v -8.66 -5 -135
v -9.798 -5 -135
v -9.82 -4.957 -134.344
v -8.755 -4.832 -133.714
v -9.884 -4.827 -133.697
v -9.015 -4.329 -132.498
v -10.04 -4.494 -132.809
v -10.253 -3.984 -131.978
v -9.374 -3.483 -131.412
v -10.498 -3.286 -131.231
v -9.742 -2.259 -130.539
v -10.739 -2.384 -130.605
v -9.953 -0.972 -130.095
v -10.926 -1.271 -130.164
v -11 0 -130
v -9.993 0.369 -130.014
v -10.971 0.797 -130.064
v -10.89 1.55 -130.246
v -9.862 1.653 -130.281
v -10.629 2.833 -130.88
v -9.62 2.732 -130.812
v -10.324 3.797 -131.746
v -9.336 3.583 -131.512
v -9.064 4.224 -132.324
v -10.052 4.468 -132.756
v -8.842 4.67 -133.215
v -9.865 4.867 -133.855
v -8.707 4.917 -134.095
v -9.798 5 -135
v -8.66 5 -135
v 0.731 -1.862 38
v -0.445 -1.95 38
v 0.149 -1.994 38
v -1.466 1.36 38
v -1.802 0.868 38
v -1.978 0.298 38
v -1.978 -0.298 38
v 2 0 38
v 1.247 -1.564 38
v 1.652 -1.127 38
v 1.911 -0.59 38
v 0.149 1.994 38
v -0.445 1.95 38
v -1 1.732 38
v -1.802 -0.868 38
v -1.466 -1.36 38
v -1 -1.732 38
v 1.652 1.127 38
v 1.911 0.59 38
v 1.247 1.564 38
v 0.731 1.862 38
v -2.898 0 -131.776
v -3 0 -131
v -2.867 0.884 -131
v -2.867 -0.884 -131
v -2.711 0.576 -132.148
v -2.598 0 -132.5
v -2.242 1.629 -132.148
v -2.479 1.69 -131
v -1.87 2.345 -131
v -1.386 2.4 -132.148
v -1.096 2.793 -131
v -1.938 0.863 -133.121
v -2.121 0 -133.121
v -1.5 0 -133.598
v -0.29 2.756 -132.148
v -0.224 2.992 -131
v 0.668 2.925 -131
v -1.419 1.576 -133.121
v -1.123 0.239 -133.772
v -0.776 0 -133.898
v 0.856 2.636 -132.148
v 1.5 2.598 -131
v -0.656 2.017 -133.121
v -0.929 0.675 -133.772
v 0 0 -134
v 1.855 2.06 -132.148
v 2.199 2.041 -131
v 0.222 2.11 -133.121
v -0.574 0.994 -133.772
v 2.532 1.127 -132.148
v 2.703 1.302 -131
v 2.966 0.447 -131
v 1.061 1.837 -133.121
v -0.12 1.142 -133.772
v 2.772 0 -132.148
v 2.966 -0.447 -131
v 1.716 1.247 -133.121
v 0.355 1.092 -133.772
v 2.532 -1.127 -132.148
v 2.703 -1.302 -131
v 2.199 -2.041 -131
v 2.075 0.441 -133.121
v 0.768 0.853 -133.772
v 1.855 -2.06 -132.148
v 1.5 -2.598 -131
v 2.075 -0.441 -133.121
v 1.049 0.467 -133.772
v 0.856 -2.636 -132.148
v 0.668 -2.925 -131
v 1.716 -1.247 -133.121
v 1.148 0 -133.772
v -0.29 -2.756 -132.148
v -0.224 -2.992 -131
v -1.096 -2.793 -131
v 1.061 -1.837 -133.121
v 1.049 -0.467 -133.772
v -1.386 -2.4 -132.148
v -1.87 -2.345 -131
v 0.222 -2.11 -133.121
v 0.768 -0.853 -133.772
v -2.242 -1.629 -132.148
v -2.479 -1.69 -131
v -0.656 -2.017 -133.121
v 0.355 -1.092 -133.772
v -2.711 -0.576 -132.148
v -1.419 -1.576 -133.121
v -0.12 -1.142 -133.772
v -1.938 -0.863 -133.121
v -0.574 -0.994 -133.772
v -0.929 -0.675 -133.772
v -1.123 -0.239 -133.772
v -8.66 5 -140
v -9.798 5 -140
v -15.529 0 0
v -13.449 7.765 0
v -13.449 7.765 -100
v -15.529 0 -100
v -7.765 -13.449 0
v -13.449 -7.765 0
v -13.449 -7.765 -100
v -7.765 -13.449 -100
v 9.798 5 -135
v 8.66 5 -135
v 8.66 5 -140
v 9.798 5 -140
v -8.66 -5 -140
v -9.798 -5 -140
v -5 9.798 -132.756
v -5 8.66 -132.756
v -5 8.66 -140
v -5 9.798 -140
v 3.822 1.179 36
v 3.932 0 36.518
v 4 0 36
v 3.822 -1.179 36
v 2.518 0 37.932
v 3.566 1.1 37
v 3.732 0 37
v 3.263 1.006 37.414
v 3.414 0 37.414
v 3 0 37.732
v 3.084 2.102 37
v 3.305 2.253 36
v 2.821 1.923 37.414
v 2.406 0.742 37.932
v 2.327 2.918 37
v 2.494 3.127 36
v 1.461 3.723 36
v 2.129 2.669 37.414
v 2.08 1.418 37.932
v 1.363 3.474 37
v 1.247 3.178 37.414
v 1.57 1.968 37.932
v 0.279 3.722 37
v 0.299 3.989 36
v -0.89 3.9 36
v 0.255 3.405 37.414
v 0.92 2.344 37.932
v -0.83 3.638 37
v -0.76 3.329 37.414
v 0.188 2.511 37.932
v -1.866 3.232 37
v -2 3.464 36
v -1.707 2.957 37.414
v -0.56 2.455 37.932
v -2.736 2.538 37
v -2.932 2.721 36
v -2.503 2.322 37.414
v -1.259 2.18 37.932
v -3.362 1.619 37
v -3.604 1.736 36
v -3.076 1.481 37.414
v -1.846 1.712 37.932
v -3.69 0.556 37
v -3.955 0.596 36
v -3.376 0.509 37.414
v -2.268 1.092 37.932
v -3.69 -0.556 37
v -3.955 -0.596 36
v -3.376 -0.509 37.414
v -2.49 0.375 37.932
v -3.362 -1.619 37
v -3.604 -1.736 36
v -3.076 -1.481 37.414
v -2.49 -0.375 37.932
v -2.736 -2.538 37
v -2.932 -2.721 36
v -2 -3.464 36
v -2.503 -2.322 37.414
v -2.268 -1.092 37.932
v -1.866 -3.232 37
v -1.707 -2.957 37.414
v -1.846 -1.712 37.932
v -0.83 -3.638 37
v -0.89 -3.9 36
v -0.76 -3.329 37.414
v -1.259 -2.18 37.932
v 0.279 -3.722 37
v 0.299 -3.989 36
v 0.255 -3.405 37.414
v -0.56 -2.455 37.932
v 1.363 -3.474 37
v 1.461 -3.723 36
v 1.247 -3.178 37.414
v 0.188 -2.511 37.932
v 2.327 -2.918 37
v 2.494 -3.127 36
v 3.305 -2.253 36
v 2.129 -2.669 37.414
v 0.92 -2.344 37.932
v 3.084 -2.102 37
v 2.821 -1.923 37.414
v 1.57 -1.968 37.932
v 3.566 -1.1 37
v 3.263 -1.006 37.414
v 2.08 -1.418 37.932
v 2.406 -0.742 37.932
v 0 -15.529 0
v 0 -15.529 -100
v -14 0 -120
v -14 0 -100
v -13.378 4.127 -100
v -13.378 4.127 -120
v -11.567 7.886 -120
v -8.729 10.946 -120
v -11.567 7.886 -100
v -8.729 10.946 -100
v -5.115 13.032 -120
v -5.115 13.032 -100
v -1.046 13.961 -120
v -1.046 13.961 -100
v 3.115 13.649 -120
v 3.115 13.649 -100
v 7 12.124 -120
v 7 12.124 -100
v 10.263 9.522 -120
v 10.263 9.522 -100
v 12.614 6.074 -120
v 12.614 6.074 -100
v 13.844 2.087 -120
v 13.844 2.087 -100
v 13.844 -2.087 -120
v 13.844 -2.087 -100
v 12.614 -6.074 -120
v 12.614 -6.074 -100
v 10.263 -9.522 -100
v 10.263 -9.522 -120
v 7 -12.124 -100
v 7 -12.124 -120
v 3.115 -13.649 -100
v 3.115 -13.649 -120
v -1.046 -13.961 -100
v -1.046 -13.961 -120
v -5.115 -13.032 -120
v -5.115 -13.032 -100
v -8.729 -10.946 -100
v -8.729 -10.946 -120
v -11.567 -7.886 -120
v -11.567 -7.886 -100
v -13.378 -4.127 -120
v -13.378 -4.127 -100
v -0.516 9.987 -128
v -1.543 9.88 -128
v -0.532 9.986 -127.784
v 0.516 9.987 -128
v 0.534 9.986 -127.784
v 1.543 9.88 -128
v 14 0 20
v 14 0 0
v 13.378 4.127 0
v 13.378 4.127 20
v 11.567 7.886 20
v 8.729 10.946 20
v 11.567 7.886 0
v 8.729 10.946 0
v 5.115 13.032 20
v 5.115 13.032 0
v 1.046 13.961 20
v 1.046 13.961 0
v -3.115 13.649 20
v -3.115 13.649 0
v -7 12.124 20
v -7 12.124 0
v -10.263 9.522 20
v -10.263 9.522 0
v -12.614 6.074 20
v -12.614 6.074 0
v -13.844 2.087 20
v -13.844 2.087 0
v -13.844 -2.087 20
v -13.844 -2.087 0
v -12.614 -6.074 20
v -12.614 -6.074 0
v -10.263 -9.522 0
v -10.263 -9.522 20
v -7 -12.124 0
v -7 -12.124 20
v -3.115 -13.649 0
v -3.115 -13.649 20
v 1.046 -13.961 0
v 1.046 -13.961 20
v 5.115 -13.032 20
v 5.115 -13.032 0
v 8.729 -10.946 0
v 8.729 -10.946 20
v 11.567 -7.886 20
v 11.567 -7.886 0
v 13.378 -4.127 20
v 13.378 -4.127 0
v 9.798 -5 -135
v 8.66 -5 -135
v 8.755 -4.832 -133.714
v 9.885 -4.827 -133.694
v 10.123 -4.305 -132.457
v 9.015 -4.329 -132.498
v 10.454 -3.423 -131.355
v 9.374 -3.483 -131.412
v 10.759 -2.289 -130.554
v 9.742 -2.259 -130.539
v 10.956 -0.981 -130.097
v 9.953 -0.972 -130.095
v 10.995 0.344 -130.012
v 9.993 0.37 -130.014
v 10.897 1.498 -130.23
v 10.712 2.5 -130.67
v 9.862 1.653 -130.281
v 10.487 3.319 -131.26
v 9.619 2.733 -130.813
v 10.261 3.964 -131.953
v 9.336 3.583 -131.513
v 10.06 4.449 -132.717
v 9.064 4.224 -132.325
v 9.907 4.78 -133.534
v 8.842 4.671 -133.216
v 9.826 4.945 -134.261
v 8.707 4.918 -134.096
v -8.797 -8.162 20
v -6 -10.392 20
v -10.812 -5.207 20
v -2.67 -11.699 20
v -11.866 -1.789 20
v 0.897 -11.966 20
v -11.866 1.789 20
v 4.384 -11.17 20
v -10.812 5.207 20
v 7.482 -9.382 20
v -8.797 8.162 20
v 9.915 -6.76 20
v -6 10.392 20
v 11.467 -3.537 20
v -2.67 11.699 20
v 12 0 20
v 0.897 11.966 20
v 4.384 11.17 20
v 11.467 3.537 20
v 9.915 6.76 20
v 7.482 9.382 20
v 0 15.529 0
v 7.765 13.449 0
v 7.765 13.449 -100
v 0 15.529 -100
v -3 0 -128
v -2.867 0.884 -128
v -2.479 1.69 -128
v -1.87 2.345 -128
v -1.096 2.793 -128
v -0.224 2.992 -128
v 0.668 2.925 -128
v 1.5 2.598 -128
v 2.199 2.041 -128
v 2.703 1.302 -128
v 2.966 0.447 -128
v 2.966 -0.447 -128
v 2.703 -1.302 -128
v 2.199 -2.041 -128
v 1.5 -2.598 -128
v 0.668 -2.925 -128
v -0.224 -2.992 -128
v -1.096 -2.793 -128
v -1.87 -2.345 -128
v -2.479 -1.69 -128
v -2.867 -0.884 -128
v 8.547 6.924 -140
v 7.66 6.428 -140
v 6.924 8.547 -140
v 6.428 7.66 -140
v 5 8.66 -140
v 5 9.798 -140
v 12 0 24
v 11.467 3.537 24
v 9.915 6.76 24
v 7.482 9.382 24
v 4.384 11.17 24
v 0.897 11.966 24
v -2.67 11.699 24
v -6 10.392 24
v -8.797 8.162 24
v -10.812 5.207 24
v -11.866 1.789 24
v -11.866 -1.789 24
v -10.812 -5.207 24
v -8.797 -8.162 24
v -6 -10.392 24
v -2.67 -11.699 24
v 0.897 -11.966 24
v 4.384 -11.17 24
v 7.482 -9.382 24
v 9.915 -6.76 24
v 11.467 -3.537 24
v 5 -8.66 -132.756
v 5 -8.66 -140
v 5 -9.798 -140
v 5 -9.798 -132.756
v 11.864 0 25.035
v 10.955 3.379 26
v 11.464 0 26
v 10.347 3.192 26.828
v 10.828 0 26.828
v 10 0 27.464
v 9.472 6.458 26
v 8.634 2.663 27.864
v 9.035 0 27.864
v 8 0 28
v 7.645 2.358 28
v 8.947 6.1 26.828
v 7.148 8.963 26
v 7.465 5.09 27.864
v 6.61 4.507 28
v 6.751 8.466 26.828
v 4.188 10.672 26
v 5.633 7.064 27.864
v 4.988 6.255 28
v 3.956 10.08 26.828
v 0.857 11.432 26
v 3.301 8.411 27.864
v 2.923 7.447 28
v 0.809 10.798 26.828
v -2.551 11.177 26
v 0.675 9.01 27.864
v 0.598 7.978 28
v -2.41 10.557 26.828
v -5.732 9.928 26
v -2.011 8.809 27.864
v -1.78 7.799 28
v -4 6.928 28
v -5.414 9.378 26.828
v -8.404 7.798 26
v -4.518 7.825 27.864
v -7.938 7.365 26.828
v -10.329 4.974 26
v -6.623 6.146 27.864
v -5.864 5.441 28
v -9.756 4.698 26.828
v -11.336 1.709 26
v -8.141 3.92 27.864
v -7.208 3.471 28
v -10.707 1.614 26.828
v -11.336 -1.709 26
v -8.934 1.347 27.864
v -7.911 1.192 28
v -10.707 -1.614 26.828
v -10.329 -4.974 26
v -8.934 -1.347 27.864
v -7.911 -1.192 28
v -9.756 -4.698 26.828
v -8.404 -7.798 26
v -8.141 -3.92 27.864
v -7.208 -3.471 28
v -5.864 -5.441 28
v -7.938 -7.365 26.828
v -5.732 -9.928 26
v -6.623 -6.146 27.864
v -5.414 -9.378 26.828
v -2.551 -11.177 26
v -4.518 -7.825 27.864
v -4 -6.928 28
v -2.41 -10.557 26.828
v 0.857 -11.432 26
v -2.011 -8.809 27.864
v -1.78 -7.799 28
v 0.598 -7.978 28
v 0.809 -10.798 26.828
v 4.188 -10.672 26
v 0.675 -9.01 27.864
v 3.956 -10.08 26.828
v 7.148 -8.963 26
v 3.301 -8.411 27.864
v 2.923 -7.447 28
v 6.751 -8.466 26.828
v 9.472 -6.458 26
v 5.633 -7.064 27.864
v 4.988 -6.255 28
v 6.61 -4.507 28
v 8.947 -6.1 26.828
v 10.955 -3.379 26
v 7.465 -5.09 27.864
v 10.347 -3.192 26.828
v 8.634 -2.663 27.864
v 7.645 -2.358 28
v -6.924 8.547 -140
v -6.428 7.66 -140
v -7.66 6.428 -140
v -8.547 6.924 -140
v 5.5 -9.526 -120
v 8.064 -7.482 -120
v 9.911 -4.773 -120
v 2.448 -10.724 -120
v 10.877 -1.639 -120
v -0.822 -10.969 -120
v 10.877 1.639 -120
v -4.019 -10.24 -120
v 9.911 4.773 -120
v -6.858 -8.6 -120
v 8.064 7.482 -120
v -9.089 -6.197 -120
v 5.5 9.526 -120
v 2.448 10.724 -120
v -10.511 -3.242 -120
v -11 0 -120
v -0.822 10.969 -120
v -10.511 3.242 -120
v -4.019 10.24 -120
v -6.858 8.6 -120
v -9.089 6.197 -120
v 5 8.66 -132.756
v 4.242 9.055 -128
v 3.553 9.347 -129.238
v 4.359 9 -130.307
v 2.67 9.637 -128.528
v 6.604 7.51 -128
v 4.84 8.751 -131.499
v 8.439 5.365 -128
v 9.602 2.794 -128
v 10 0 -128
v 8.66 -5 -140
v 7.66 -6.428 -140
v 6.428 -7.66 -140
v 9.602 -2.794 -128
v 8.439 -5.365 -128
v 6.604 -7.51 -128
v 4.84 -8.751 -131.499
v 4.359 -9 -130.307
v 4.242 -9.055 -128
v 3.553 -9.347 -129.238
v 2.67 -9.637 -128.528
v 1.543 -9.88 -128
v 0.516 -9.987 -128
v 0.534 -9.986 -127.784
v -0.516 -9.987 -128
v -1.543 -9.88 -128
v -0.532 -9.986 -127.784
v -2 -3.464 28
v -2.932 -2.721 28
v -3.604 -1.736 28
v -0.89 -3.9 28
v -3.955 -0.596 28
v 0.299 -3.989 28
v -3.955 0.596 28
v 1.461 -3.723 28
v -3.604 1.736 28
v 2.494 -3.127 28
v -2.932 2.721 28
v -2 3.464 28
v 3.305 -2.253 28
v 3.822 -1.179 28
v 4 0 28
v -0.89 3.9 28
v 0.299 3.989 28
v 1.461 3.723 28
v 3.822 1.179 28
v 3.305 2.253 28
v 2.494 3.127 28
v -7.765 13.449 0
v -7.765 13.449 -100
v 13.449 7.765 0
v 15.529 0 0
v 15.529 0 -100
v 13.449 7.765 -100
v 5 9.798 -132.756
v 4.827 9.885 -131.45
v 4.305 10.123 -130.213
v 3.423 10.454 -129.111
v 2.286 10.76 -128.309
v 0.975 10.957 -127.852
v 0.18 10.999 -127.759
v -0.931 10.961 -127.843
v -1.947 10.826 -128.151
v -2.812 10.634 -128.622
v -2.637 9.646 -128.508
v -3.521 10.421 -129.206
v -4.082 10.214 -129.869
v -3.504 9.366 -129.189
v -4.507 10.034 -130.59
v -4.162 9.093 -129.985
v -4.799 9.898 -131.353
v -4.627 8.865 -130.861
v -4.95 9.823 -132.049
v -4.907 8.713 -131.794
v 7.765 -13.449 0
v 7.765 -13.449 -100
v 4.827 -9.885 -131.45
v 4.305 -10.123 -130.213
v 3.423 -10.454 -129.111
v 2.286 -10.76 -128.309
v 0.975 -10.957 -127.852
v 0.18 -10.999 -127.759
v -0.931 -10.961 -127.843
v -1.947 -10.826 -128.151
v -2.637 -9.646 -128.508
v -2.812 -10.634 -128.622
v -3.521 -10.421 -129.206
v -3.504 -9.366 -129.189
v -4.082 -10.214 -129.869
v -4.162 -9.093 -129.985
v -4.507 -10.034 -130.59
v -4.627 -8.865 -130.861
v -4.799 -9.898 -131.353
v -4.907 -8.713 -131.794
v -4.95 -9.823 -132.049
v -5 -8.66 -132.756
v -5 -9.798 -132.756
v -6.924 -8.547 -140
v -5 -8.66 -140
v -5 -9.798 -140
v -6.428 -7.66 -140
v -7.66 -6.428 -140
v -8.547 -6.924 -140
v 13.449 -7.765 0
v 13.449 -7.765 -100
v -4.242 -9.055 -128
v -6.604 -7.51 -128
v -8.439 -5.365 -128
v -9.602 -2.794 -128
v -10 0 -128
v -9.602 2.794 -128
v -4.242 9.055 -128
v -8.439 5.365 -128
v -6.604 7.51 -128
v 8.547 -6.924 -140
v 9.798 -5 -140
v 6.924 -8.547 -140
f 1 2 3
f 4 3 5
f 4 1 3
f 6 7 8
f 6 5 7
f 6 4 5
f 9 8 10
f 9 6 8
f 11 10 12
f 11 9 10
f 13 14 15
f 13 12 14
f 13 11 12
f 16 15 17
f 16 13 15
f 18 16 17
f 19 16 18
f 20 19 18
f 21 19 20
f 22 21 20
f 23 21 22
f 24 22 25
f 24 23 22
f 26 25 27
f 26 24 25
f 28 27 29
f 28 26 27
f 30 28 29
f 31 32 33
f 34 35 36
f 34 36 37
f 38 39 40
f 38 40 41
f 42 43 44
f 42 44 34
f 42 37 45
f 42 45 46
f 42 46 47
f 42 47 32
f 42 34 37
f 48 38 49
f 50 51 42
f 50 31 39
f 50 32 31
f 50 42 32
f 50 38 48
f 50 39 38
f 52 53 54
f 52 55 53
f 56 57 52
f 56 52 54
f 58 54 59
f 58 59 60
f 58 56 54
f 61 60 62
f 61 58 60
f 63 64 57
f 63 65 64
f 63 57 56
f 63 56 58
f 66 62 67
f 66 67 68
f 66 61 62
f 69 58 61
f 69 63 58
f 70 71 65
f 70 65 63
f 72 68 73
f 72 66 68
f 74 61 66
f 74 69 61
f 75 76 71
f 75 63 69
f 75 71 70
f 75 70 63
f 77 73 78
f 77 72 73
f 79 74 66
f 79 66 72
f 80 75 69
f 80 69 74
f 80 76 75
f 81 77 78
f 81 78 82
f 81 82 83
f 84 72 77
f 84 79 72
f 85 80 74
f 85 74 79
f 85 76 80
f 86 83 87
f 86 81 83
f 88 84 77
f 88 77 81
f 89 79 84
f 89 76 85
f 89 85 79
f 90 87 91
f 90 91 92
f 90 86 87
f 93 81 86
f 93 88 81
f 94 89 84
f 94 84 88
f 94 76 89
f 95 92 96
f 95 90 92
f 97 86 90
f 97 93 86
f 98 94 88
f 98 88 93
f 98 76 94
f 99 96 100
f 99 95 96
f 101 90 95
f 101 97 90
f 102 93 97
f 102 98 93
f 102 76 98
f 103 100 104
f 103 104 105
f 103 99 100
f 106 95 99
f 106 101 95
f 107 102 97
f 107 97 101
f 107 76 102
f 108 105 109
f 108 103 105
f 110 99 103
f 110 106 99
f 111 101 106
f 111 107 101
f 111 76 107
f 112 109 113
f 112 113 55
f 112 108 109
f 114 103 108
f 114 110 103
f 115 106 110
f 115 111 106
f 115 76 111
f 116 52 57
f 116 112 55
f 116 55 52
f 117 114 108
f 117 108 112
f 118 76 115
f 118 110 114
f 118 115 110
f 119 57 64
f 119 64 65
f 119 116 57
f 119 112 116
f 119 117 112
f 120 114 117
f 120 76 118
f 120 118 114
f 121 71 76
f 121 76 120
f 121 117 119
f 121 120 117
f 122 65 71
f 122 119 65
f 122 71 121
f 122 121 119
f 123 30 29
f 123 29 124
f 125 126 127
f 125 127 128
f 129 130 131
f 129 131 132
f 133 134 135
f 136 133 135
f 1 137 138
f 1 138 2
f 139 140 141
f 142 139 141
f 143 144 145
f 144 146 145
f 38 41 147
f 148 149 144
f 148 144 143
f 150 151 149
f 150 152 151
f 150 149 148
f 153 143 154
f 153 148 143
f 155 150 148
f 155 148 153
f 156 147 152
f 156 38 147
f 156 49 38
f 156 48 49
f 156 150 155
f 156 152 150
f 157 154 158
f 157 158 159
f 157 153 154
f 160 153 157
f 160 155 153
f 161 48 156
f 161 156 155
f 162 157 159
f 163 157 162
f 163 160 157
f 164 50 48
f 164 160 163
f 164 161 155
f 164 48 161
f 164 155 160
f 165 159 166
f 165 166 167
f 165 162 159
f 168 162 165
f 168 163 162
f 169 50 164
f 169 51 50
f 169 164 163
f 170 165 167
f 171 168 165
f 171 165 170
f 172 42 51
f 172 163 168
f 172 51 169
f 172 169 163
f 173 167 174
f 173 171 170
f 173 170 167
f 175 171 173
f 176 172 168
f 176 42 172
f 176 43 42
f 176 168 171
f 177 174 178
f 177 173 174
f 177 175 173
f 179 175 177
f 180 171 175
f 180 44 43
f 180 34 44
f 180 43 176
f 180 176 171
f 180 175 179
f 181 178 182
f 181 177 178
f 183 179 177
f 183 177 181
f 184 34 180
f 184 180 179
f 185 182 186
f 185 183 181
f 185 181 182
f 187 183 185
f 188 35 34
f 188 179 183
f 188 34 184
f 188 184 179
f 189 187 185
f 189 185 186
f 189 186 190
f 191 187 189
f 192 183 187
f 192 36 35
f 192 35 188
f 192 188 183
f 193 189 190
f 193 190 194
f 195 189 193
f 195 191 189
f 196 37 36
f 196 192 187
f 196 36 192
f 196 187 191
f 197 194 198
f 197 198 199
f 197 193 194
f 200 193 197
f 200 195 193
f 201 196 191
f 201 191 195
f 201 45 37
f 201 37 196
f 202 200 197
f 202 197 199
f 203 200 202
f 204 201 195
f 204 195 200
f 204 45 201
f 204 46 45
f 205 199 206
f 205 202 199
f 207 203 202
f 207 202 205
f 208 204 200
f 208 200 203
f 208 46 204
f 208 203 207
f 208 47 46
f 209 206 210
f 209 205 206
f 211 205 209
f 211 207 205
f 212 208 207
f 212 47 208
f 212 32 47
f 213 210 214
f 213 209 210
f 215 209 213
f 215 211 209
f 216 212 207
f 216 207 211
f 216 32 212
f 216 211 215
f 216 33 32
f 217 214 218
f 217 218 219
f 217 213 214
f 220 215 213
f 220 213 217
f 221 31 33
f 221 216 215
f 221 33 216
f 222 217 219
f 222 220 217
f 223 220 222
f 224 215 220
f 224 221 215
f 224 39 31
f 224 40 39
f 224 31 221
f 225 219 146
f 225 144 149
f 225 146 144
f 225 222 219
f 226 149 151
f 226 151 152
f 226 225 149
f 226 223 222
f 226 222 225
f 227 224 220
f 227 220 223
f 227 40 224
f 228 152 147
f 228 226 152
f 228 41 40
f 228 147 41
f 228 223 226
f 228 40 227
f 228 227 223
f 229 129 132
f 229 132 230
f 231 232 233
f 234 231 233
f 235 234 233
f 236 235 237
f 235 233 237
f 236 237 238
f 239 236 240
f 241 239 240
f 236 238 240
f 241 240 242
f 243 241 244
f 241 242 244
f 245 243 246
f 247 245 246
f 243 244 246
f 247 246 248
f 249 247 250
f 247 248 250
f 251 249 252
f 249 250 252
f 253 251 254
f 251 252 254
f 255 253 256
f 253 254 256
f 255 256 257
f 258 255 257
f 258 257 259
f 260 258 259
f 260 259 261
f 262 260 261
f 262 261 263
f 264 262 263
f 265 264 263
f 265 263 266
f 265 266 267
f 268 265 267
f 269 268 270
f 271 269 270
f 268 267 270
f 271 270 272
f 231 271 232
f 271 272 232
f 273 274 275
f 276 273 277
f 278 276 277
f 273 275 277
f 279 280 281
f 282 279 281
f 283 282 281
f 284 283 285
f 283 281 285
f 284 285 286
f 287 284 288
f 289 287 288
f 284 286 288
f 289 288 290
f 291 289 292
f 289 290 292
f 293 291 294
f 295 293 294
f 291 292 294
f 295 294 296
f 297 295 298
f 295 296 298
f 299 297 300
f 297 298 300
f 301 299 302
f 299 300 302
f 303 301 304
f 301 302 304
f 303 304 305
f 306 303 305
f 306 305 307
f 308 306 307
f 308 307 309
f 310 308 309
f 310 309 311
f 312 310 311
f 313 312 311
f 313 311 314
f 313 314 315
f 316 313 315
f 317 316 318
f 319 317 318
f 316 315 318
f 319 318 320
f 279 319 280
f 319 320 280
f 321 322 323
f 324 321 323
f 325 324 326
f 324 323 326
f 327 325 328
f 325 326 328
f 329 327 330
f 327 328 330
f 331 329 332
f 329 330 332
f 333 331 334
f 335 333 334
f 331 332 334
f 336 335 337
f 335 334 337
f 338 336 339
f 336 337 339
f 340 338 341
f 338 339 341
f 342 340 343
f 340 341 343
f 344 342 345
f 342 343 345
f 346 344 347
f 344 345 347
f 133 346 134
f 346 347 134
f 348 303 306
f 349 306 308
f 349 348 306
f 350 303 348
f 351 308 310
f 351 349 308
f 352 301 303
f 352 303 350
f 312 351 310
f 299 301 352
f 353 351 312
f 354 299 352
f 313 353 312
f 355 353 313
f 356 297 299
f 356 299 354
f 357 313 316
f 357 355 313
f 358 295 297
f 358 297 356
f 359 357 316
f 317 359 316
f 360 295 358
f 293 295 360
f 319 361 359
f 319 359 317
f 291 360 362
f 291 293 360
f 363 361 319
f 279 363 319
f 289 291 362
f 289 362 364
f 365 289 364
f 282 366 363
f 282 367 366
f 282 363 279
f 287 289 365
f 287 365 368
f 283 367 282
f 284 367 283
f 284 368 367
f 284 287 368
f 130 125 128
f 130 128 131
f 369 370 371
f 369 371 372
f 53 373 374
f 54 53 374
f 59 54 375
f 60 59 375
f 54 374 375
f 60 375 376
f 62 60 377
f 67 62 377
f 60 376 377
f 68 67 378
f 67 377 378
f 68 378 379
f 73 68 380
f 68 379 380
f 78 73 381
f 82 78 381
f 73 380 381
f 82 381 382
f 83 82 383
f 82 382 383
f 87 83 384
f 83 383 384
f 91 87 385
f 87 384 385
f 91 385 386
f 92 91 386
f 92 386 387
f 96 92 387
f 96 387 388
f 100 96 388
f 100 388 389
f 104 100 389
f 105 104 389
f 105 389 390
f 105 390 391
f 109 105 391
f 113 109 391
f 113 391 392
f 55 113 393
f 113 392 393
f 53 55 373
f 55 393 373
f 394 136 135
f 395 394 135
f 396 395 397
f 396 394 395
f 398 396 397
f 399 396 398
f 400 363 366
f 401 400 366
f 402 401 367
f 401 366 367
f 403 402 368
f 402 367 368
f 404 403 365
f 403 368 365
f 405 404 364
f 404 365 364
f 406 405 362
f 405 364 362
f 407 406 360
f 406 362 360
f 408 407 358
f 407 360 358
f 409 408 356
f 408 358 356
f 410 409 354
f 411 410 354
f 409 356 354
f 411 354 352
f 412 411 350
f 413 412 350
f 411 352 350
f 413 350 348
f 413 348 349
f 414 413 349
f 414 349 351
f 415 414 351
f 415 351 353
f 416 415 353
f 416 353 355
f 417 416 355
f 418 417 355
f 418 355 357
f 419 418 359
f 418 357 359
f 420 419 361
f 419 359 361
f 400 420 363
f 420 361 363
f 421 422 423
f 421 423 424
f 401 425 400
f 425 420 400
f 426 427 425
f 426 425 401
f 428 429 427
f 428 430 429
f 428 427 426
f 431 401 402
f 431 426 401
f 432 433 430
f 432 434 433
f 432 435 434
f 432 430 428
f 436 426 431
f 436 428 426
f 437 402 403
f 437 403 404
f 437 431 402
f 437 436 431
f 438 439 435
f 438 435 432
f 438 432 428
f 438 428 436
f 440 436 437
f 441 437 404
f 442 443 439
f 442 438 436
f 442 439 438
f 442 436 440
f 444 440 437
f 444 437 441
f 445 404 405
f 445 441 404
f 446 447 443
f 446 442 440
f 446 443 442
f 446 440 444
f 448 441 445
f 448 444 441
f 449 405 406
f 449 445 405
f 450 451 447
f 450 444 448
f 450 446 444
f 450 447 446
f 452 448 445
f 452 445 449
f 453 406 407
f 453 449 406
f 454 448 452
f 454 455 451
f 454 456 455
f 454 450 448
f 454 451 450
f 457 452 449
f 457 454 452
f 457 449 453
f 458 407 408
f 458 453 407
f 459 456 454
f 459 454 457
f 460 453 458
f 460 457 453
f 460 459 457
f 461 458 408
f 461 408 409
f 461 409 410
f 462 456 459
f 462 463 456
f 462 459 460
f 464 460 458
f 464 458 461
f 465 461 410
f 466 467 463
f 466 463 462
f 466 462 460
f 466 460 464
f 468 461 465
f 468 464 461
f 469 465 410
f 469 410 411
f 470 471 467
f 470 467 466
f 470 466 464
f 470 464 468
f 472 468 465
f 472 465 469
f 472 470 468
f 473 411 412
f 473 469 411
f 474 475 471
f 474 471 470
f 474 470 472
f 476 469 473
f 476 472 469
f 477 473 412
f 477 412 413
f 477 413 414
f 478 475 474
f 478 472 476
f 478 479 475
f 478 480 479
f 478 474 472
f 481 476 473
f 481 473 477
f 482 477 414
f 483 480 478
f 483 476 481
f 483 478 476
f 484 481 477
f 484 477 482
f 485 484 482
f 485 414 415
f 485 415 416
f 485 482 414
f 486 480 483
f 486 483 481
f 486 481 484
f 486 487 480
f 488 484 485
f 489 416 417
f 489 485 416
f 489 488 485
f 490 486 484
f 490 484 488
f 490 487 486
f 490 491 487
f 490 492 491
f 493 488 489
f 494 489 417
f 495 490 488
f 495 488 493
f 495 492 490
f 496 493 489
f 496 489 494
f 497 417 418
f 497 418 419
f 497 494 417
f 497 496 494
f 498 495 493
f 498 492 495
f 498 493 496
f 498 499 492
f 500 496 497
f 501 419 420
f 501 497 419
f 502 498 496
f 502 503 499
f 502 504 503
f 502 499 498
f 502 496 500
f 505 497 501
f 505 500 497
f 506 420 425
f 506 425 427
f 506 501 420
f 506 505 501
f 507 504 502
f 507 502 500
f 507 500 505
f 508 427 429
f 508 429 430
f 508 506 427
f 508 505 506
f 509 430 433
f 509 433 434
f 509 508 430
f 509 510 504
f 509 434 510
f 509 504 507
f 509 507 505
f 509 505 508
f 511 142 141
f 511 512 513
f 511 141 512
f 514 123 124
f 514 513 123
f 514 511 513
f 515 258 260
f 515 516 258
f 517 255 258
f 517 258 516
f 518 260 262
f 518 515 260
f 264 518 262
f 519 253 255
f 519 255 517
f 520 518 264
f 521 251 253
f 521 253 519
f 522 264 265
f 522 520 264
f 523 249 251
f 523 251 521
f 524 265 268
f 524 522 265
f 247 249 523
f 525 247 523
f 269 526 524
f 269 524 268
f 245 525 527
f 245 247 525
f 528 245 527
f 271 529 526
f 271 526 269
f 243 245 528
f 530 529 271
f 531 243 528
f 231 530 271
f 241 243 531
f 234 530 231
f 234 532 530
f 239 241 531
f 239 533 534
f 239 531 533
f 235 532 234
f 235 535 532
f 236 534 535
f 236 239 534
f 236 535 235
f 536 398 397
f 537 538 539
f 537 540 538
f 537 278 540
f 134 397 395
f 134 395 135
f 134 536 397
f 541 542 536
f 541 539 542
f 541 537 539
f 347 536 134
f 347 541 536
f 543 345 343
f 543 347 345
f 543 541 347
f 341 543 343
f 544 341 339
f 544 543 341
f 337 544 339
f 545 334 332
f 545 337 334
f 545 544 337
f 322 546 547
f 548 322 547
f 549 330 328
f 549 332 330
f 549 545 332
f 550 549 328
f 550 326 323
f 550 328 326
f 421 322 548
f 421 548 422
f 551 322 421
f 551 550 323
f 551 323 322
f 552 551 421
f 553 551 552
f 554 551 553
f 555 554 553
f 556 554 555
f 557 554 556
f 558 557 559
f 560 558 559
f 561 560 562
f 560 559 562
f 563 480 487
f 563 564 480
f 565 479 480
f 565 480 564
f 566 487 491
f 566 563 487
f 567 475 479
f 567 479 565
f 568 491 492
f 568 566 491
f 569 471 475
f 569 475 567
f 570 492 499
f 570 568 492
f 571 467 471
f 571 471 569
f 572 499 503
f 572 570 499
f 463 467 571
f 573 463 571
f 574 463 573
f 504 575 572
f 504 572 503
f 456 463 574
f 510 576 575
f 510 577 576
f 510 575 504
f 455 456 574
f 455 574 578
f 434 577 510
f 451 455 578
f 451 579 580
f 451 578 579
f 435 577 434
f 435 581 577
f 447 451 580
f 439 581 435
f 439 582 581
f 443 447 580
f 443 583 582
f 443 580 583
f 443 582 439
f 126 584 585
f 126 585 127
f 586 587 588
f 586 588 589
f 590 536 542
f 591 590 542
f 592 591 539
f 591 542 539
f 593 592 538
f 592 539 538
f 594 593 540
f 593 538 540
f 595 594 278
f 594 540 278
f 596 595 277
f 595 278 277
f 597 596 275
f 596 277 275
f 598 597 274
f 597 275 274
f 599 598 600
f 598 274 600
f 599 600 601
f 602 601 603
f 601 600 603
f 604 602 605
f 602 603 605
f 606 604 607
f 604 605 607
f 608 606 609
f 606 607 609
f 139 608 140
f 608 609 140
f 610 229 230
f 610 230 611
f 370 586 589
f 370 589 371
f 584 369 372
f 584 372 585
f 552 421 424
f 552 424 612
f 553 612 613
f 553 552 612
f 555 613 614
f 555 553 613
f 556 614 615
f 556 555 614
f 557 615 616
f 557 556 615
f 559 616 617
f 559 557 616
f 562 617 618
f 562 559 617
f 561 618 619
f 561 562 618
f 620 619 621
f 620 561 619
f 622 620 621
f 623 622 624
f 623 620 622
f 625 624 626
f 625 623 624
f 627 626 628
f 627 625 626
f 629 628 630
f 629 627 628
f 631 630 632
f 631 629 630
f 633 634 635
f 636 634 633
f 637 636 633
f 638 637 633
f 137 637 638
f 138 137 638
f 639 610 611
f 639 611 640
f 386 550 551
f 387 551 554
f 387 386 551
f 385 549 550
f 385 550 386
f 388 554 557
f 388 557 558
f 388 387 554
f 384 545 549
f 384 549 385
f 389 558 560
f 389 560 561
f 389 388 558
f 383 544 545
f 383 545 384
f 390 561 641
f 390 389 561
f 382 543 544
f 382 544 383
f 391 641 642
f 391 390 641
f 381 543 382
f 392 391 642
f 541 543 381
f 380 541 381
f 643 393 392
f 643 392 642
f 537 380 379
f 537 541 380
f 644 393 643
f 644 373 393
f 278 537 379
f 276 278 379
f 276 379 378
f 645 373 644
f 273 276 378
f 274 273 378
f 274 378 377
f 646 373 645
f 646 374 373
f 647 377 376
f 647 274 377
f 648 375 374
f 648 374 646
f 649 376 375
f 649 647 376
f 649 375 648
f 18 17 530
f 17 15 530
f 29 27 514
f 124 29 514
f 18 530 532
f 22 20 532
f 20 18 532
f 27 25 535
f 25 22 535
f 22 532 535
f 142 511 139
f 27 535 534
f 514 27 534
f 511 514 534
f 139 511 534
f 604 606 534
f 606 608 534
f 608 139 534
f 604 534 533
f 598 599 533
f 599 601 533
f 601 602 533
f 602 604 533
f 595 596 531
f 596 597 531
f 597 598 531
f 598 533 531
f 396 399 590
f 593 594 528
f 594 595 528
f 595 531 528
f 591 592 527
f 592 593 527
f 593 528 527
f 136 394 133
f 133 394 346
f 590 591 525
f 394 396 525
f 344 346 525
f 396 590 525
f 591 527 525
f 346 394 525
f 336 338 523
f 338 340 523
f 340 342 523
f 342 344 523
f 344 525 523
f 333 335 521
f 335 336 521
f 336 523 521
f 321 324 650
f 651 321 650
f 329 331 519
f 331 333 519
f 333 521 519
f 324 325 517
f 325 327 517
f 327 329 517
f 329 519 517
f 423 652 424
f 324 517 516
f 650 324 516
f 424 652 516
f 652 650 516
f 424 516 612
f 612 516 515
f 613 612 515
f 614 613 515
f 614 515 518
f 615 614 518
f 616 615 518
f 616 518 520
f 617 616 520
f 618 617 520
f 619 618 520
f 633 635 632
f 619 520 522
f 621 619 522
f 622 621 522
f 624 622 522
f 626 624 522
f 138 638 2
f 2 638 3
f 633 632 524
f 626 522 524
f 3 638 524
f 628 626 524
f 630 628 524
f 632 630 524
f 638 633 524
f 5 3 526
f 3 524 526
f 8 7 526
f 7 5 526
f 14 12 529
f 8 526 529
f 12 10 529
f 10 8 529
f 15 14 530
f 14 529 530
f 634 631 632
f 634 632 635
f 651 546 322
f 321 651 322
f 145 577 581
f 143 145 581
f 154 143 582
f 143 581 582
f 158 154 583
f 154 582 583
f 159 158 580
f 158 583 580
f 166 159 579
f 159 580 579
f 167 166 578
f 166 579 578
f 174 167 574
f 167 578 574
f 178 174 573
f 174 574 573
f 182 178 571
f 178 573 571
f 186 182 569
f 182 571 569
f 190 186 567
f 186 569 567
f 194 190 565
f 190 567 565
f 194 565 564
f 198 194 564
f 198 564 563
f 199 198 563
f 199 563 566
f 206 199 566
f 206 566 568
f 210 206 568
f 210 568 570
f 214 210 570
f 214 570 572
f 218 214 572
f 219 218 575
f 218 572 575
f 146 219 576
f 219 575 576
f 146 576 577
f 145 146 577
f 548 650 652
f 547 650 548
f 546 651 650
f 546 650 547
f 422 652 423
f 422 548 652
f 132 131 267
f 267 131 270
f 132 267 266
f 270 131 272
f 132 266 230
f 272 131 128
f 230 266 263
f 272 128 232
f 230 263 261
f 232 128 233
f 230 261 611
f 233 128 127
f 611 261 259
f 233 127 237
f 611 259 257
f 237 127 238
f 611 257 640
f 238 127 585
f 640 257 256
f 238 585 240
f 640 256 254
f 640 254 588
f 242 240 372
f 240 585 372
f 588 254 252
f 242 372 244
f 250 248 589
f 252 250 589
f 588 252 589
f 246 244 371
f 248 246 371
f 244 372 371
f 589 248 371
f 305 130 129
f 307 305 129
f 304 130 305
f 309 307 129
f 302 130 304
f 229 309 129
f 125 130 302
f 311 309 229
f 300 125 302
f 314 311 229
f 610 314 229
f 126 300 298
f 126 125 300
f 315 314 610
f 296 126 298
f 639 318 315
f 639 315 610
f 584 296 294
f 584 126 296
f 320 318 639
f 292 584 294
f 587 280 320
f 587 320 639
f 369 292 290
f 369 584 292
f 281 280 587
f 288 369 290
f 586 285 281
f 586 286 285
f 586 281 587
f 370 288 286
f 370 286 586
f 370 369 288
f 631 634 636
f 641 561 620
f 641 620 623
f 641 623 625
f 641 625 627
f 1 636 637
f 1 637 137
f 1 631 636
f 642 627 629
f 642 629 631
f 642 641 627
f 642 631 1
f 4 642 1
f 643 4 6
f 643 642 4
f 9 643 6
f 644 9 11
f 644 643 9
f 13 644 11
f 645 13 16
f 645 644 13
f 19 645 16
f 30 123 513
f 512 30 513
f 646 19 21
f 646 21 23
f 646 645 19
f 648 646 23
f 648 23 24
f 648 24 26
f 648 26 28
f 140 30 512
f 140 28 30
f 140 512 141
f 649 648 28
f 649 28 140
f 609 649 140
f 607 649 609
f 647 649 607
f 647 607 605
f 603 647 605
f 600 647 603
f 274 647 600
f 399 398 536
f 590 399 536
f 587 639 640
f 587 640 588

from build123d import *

# Parameters (mm, degrees)
BOSS_EXTRUDE1_DEPTH            = 100
SKETCH2_R                      = 14
BOSS_EXTRUDE2_DEPTH            = 20
SKETCH3_R                      = 12
BOSS_EXTRUDE3_DEPTH            = 8
FILLET1_R                      = 4
SKETCH4_R                      = 4
BOSS_EXTRUDE4_DEPTH            = 10
FILLET2_R                      = 2
SKETCH6_R                      = 14
BOSS_EXTRUDE6_DEPTH            = 20
SKETCH7_R                      = 11
SKETCH7_R_2                    = 10
BOSS_EXTRUDE7_DEPTH            = 20
CUT_EXTRUDE1_REACH             = 17.529
CUT_EXTRUDE1_DIRECTION_2_REACH = 17.529
CUT_EXTRUDE2_REACH             = 17.529
CUT_EXTRUDE2_DIRECTION_2_REACH = 17.529
SKETCH10_R                     = 10
BOSS_EXTRUDE8_DEPTH            = 8
SKETCH11_R                     = 3
BOSS_EXTRUDE9_DEPTH            = 6
FILLET3_R                      = 3


with BuildPart() as part:
    # Sketch1 → Boss-Extrude1 (new body)
    with BuildSketch(Plane.XY):
        Polygon((-15.529142706, 0), (-13.448632083, -7.764571353), (-7.764571353, -13.448632083), (0, -15.529142706), (7.764571353, -13.448632083), (13.448632083, -7.764571353), (15.529142706, 0), (13.448632083, 7.764571353), (7.764571353, 13.448632083), (0, 15.529142706), (-7.764571353, 13.448632083), (-13.448632083, 7.764571353), align=None)
    extrude(amount=-BOSS_EXTRUDE1_DEPTH)

    # Sketch2 → Boss-Extrude2 (add)
    with BuildSketch(Plane.XY):
        Circle(SKETCH2_R)
    extrude(amount=BOSS_EXTRUDE2_DEPTH)

    # Sketch3 → Boss-Extrude3 (add)
    with BuildSketch(Plane.XY.offset(20)):
        Circle(SKETCH3_R)
    extrude(amount=BOSS_EXTRUDE3_DEPTH)

    # Fillet1
    fillet1_edges = [part.edges().sort_by_distance(p)[0] for p in [
        (-12, 0, 28),
    ]]
    fillet(fillet1_edges, radius=FILLET1_R)

    # Sketch4 → Boss-Extrude4 (add)
    with BuildSketch(Plane.XY.offset(28)):
        Circle(SKETCH4_R)
    extrude(amount=BOSS_EXTRUDE4_DEPTH)

    # Fillet2
    fillet2_edges = [part.edges().sort_by_distance(p)[0] for p in [
        (-4, 0, 38),
    ]]
    fillet(fillet2_edges, radius=FILLET2_R)

    # Sketch6 → Boss-Extrude6 (add)
    with BuildSketch(Plane(origin=(0, 0, -100), x_dir=(-1, 0, 0), z_dir=(0, 0, -1))):
        Circle(SKETCH6_R)
    extrude(amount=BOSS_EXTRUDE6_DEPTH)

    # Sketch7 → Boss-Extrude7 (add)
    with BuildSketch(Plane(origin=(0, 0, -120), x_dir=(-1, 0, 0), z_dir=(0, 0, -1))):
        Circle(SKETCH7_R)
        Circle(SKETCH7_R_2, mode=Mode.SUBTRACT)
    extrude(amount=BOSS_EXTRUDE7_DEPTH)

    # Sketch8 → Cut-Extrude1 (cut, up to next)
    with BuildSketch(Plane(origin=(0, 0, 0), x_dir=(0, 0, -1), z_dir=(1, 0, 0)), mode=Mode.PRIVATE) as cut_extrude1_sk1:
        with BuildLine():
            Line((145, -5), (135, -5))
            ThreePointArc((135, -5), (130, 0), (135, 5))
            Line((135, 5), (145, 5))
            Line((145, 5), (145, -5))
        make_face()
    cut_extrude1_tool1 = extrude(cut_extrude1_sk1.sketch, amount=-CUT_EXTRUDE1_REACH, mode=Mode.PRIVATE) & part.part
    add(cut_extrude1_tool1.solids().sort_by_distance((0, 0, -137.991792))[0], mode=Mode.SUBTRACT)

    # Sketch8 → Cut-Extrude1 direction 2 (cut, up to next)
    with BuildSketch(Plane(origin=(0, 0, 0), x_dir=(0, 0, -1), z_dir=(1, 0, 0)), mode=Mode.PRIVATE) as cut_extrude1_direction_2_sk1:
        with BuildLine():
            Line((145, -5), (135, -5))
            ThreePointArc((135, -5), (130, 0), (135, 5))
            Line((135, 5), (145, 5))
            Line((145, 5), (145, -5))
        make_face()
    cut_extrude1_direction_2_tool1 = extrude(cut_extrude1_direction_2_sk1.sketch, amount=CUT_EXTRUDE1_DIRECTION_2_REACH, mode=Mode.PRIVATE) & part.part
    add(cut_extrude1_direction_2_tool1.solids().sort_by_distance((0, 0, -137.991792))[0], mode=Mode.SUBTRACT)

    # Sketch9 → Cut-Extrude2 (cut, up to next)
    with BuildSketch(Plane(origin=(0, 0, 0), x_dir=(1, 0, 0), z_dir=(0, 1, 0)), mode=Mode.PRIVATE) as cut_extrude2_sk1:
        with BuildLine():
            Line((-5, 132.755823636), (-5, 147.244176364))
            Line((-5, 147.244176364), (5, 147.244176364))
            Line((5, 147.244176364), (5, 132.755823636))
            ThreePointArc((5, 132.755823636), (0, 127.755823636), (-5, 132.755823636))
        make_face()
    cut_extrude2_tool1 = extrude(cut_extrude2_sk1.sketch, amount=-CUT_EXTRUDE2_REACH, mode=Mode.PRIVATE) & part.part
    add(cut_extrude2_tool1.solids().sort_by_distance((0, 0, -138.00269))[0], mode=Mode.SUBTRACT)

    # Sketch9 → Cut-Extrude2 direction 2 (cut, up to next)
    with BuildSketch(Plane(origin=(0, 0, 0), x_dir=(1, 0, 0), z_dir=(0, 1, 0)), mode=Mode.PRIVATE) as cut_extrude2_direction_2_sk1:
        with BuildLine():
            Line((-5, 132.755823636), (-5, 147.244176364))
            Line((-5, 147.244176364), (5, 147.244176364))
            Line((5, 147.244176364), (5, 132.755823636))
            ThreePointArc((5, 132.755823636), (0, 127.755823636), (-5, 132.755823636))
        make_face()
    cut_extrude2_direction_2_tool1 = extrude(cut_extrude2_direction_2_sk1.sketch, amount=CUT_EXTRUDE2_DIRECTION_2_REACH, mode=Mode.PRIVATE) & part.part
    add(cut_extrude2_direction_2_tool1.solids().sort_by_distance((0, 0, -138.00269))[0], mode=Mode.SUBTRACT)

    # Sketch10 → Boss-Extrude8 (add)
    with BuildSketch(Plane(origin=(0, 0, -120), x_dir=(-1, 0, 0), z_dir=(0, 0, -1))):
        Circle(SKETCH10_R)
    extrude(amount=BOSS_EXTRUDE8_DEPTH)

    # Sketch11 → Boss-Extrude9 (add)
    with BuildSketch(Plane(origin=(0, 0, -128), x_dir=(-1, 0, 0), z_dir=(0, 0, -1))):
        Circle(SKETCH11_R)
    extrude(amount=BOSS_EXTRUDE9_DEPTH)

    # Fillet3
    fillet3_edges = [part.edges().sort_by_distance(p)[0] for p in [
        (3, 0, -134),
    ]]
    fillet(fillet3_edges, radius=FILLET3_R)


solid = part.part
